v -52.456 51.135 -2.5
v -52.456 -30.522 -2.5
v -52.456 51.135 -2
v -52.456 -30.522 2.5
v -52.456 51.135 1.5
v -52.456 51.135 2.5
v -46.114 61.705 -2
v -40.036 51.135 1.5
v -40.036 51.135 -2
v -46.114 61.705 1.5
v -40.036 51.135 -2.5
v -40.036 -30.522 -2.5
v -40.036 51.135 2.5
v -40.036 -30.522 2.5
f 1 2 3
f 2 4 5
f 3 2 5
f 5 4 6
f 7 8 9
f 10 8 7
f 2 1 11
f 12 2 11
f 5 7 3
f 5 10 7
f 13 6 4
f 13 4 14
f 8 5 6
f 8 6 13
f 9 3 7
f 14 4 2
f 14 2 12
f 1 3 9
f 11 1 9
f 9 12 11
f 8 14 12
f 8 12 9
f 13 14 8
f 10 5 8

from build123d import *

# Parameters (mm, degrees)
F0_W      = 12.420304
F0_H      = 81.656884
F1_DEPTH  = 2.5
F2_DEPTH  = 1.5
F1_FACE_W = 12.420304
F1_FACE_H = 81.656884
F3_DEPTH  = 5
F4_DEPTH  = 2


with BuildPart() as f1:
    # F0 (on Top) → F1 (new body)
    with BuildSketch(Plane.XY):
        with Locations((-46.245806, 10.306211)):
            Rectangle(F0_W, F0_H)
    extrude(amount=F1_DEPTH)

    # F0 (on Top) → F2 (join)
    with BuildSketch(Plane.XY):
        Polygon((-46.113677, 61.70512), (-52.455958, 51.134653), (-40.035654, 51.134653), align=None)
    extrude(amount=F2_DEPTH)

    # F1_face (on face) → F3 (join)
    with BuildSketch(Plane(origin=(-46.245806, 10.306211, 2.5), x_dir=(1, 0, 0), z_dir=(0, 0, 1))):
        Rectangle(F1_FACE_W, F1_FACE_H)
    extrude(amount=-F3_DEPTH)

    # F0 (on Top) → F4 (join)
    with BuildSketch(Plane.XY):
        Polygon((-46.113677, 61.70512), (-52.455958, 51.134653), (-40.035654, 51.134653), align=None)
    extrude(amount=-F4_DEPTH)


solid = f1.part
